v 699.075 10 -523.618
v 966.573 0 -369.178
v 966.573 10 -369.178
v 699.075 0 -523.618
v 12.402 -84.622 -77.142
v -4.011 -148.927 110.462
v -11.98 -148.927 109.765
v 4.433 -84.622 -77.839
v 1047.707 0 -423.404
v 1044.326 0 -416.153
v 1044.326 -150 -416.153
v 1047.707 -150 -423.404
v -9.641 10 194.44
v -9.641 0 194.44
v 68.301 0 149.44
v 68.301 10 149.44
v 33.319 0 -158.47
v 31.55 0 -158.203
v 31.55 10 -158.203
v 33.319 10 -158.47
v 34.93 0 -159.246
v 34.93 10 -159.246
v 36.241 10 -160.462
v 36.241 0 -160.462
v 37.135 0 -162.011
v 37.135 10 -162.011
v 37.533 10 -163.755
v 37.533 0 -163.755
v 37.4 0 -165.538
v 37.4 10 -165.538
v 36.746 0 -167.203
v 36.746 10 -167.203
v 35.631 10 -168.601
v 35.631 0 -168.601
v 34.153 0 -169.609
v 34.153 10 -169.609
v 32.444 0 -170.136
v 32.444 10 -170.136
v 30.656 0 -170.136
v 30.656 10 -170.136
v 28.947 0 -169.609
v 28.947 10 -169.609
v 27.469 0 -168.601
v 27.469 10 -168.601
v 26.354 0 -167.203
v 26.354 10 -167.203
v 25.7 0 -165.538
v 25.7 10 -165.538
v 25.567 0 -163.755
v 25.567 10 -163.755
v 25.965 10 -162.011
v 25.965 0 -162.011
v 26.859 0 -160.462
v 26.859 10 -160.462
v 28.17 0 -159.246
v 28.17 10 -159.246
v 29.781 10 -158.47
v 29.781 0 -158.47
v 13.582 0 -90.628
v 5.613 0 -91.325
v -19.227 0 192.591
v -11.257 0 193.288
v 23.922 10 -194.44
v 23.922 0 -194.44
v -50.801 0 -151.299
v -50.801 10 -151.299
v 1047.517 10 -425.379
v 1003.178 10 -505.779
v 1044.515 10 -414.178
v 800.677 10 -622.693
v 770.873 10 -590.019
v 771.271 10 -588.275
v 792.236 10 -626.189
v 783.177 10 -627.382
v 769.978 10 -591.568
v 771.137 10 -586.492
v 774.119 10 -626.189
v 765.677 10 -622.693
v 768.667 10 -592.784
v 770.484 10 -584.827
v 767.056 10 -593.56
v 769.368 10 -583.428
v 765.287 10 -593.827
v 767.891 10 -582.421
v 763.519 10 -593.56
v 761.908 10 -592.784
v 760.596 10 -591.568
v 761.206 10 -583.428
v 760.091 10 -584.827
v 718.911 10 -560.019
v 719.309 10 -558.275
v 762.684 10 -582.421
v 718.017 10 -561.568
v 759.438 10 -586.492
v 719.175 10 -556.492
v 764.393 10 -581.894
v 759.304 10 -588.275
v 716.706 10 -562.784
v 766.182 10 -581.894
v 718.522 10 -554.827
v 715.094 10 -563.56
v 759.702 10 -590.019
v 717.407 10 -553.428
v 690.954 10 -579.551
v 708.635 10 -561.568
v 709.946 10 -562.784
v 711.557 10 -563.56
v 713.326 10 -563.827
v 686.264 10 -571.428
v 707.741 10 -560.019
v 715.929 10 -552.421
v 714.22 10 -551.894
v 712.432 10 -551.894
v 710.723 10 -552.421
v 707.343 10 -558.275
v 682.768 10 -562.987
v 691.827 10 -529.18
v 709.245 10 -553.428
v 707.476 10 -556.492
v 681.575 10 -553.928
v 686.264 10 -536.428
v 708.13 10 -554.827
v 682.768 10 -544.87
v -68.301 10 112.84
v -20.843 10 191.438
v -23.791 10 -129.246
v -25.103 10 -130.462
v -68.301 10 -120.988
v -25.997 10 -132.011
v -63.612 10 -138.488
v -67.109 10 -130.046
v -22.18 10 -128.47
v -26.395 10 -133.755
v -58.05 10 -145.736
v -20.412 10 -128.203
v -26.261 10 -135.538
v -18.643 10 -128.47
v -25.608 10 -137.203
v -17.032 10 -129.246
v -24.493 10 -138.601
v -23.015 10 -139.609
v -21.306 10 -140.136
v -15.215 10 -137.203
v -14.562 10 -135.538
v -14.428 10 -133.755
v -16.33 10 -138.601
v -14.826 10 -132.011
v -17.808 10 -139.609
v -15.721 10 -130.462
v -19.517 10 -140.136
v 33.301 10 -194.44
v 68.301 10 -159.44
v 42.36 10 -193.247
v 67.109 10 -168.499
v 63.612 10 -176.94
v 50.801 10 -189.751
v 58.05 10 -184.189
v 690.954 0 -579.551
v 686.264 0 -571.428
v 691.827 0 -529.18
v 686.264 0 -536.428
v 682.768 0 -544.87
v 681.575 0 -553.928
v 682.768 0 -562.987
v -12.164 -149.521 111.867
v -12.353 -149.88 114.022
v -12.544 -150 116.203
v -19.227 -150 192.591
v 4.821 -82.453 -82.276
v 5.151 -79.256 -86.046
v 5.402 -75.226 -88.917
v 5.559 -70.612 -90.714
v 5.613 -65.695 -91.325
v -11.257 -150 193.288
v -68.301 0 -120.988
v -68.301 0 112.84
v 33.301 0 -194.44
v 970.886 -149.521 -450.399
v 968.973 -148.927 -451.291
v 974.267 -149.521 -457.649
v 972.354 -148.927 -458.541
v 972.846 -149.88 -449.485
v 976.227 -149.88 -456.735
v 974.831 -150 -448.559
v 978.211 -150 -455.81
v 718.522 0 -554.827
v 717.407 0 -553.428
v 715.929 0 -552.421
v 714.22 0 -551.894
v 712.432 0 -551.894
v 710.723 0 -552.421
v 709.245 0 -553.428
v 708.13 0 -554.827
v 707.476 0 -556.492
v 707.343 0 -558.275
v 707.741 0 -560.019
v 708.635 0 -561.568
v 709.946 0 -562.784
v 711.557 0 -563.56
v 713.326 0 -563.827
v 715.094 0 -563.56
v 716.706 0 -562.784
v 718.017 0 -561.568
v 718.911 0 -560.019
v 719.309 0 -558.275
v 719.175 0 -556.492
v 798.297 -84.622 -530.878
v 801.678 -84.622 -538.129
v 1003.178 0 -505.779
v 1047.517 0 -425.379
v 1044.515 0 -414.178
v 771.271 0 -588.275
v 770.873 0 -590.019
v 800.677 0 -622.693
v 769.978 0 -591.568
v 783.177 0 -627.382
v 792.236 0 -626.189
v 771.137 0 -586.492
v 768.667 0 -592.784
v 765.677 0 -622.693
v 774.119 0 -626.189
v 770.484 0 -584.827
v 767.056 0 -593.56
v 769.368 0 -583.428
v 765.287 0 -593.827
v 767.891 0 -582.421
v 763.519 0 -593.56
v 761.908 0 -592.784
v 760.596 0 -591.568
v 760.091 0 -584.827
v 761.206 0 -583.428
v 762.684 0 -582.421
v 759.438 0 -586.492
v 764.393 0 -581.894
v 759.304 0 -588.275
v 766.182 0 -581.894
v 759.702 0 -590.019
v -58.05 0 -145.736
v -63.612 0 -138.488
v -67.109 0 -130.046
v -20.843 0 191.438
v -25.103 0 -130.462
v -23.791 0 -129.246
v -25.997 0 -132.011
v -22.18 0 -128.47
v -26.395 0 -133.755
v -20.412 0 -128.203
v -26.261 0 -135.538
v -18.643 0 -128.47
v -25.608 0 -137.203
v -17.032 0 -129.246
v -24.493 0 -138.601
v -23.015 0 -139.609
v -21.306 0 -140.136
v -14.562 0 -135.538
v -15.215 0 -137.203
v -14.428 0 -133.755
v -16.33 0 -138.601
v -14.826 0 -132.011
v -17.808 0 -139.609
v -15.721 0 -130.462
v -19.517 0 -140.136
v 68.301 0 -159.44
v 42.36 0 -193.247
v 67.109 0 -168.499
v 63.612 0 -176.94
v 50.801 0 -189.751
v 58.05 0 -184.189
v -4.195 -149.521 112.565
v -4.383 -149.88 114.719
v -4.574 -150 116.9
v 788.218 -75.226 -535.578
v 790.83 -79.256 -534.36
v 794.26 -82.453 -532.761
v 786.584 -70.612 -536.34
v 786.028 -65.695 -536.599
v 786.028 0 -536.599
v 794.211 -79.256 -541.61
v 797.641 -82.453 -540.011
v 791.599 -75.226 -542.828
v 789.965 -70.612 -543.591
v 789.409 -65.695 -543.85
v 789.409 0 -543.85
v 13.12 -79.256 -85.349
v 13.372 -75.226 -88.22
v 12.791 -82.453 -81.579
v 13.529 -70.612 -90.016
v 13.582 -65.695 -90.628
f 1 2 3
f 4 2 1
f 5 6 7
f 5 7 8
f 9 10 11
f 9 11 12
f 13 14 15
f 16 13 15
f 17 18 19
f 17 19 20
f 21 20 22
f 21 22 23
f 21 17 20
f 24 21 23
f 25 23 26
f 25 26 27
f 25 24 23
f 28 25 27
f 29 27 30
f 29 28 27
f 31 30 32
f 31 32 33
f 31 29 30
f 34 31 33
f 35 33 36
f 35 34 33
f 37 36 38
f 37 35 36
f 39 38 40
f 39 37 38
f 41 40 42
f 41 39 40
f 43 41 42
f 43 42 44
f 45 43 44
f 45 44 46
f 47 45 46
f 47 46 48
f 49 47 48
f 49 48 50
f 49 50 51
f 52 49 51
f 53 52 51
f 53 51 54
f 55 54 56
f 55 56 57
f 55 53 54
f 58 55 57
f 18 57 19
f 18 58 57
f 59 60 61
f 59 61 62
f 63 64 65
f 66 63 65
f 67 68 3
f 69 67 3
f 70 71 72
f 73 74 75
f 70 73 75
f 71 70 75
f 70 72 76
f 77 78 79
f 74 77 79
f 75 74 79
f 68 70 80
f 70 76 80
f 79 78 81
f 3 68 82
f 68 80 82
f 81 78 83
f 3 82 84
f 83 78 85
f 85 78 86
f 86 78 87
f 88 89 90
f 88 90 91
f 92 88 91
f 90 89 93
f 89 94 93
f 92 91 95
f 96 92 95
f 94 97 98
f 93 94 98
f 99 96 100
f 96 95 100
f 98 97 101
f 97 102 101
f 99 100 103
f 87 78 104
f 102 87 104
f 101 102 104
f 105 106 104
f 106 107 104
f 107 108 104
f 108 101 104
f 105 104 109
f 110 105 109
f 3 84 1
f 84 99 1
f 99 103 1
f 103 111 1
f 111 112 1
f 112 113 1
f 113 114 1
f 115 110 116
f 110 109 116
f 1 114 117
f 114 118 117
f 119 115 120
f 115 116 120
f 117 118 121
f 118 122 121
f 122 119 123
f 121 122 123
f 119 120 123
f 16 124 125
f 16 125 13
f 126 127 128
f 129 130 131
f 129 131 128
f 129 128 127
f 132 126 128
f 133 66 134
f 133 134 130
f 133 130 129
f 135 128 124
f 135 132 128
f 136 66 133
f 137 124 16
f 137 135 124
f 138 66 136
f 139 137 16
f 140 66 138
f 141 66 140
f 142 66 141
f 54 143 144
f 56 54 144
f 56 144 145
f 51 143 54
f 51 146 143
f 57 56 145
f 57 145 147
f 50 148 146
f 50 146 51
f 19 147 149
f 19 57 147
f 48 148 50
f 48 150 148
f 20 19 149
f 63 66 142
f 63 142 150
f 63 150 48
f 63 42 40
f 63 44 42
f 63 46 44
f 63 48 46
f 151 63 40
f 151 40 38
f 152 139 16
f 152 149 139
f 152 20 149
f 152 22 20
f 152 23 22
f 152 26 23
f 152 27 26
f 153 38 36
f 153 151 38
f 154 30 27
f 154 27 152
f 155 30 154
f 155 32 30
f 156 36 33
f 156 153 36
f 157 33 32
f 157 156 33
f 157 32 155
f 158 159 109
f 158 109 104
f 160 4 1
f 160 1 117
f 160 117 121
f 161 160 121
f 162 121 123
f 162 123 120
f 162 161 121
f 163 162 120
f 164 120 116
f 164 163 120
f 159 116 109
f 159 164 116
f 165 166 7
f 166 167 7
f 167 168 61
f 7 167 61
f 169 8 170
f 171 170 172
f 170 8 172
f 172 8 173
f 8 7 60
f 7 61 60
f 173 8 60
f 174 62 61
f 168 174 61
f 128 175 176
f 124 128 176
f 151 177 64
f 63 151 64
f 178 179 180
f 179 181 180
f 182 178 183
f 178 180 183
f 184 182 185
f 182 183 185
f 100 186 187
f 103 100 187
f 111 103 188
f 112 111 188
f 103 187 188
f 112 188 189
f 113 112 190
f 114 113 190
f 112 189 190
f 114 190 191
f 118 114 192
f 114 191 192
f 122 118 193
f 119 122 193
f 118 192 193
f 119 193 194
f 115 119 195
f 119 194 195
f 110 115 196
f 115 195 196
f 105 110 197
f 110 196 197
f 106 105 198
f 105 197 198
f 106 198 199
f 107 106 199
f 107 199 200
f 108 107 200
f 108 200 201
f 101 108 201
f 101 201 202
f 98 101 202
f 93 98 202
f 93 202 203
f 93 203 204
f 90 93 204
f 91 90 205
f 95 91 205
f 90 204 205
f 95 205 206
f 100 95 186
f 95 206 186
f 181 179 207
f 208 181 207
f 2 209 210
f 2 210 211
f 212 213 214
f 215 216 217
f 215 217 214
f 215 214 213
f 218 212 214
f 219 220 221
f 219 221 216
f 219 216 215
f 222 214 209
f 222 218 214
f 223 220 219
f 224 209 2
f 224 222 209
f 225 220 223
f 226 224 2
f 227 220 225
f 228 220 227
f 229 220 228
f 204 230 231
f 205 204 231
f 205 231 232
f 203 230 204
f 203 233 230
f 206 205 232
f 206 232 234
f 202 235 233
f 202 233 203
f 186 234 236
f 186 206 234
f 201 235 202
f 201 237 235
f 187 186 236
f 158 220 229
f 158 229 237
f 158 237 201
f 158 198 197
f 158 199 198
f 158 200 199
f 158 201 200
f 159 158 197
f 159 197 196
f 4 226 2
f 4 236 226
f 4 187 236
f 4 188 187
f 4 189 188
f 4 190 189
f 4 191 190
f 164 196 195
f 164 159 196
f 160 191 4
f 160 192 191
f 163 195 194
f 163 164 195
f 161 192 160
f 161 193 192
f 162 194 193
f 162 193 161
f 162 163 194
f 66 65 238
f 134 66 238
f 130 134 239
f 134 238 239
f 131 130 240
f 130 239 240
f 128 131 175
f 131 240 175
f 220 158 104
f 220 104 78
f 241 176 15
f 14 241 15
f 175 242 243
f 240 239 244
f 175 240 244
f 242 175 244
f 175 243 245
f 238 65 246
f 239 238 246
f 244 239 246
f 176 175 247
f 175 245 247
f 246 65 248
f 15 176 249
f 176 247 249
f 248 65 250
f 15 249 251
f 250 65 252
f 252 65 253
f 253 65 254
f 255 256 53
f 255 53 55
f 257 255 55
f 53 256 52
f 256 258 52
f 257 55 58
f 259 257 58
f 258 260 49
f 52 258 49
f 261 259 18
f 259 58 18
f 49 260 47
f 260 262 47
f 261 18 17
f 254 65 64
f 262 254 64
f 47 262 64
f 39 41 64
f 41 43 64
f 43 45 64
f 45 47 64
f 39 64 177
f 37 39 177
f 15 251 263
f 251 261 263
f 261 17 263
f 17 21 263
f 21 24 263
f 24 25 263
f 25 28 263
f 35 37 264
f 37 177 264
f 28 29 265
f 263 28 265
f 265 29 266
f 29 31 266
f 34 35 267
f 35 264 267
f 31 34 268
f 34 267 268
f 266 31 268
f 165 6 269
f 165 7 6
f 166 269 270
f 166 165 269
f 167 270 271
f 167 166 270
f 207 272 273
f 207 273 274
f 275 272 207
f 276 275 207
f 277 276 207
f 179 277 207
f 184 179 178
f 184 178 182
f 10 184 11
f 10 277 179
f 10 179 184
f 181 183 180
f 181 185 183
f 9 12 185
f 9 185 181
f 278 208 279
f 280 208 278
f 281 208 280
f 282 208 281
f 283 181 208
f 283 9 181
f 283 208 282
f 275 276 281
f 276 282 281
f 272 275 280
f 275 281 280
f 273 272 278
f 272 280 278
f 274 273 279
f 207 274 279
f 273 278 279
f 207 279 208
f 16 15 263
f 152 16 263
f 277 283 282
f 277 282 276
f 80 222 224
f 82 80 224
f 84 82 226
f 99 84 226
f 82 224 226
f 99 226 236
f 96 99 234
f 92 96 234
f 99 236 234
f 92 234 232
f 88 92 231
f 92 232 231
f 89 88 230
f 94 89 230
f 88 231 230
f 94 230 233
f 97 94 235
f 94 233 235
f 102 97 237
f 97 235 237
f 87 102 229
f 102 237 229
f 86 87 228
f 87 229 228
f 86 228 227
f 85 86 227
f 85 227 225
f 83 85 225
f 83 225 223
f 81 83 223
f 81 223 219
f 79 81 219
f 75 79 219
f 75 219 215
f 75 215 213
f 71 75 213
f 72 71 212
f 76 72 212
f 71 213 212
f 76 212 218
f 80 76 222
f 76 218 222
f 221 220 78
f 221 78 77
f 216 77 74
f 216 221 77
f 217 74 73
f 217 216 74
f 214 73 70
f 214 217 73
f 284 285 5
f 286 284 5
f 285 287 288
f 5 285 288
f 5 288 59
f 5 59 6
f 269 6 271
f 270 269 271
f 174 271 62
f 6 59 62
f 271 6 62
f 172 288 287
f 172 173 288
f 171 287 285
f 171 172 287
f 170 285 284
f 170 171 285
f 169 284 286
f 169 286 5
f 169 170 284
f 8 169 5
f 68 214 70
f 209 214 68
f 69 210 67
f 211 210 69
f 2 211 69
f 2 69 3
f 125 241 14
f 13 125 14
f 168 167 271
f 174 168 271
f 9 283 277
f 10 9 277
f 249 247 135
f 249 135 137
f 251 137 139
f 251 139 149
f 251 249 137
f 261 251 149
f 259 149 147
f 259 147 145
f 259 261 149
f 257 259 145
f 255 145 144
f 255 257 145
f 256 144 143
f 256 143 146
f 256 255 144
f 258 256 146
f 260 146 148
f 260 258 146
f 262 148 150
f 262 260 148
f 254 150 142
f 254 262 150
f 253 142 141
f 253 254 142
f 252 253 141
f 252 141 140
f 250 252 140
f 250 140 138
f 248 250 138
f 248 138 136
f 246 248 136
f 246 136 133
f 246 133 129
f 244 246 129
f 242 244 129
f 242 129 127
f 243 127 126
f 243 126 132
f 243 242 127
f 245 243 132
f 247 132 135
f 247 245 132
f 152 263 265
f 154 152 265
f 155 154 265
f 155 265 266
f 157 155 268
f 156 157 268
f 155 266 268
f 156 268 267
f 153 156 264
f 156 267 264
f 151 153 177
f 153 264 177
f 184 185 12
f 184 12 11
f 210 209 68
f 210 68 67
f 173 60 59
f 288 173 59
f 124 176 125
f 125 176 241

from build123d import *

# Parameters (mm, degrees)
SKETCH1_R           = 6
BOSS_EXTRUDE1_DEPTH = 10
EXTRUDE_THIN1_DEPTH = 150
CUT_EXTRUDE1_DEPTH  = 8
FILLET1_R           = 20


with BuildPart() as part:
    # Sketch1 → Boss-Extrude1 (new body)
    with BuildSketch(Plane(origin=(0, 0, 0), x_dir=(1, 0, 0), z_dir=(0, 1, 0))):
        with BuildLine():
            Line((23.921775059, 194.44), (-50.80127019, 151.298629711))
            ThreePointArc((-50.80127019, 151.298629711), (-63.612159322, 138.487740578), (-68.30127019, 120.987740578))
            Line((-68.30127019, 120.987740578), (-68.30127019, -112.84))
            Line((-68.30127019, -112.84), (-20.842811266, -191.438488045))
            Line((-20.842811266, -191.438488045), (-9.641016151, -194.44))
            Line((-9.641016151, -194.44), (68.30127019, -149.44))
            Line((68.30127019, -149.44), (68.30127019, 159.44))
            ThreePointArc((68.30127019, 159.44), (58.050007532, 184.188737342), (33.30127019, 194.44))
            Line((33.30127019, 194.44), (23.921775059, 194.44))
        make_face()
        with Locations(Location((31.55, 164.203141572, 0), (0, 0, 270))):
            Circle(SKETCH1_R, mode=Mode.SUBTRACT)
        with Locations(Location((-20.411524227, 134.203141572, 0), (0, 0, 270))):
            Circle(SKETCH1_R, mode=Mode.SUBTRACT)
    extrude(amount=BOSS_EXTRUDE1_DEPTH)


with BuildPart() as body_2:
    # Sketch2 → Extrude-Thin1 (new body)
    with BuildSketch(Plane.XZ):
        Polygon((-19.2266925, 192.590621052), (5.612694183, -91.324867905), (13.582251767, -90.627621963), (-11.257134916, 193.287866994), align=None)
    extrude(amount=EXTRUDE_THIN1_DEPTH)

    # Sketch3 → Cut-Extrude1 (cut)
    with BuildSketch(Plane(origin=(5.610418606, 0, 0.490848026), x_dir=(0.08715574274766193, 0, -0.9961946980917453), z_dir=(0.9961946980917453, 0, 0.08715574274766193))):
        Polygon((91.466527741, -150), (-113.533472259, -150), (91.466527741, -80), align=None)
    extrude(amount=-CUT_EXTRUDE1_DEPTH, mode=Mode.SUBTRACT)

    # Fillet1
    fillet1_edges = [body_2.edges().sort_by_distance(p)[0] for p in [
        (-8.269454288, -150, 113.243668175),
        (9.597472975, -80, -90.976244934),
    ]]
    fillet(fillet1_edges, radius=FILLET1_R)


with BuildPart() as body_3:
    # Mirror2: mirrored copy
    add(part.part.mirror(Plane(origin=(435.6525, 0, -251.524088148), x_dir=(0.49999999999999495, 0, 0.8660254037844416), z_dir=(-0.8660254037844416, 0, 0.49999999999999495))))


with BuildPart() as body_4:
    # Mirror2 2: mirrored copy
    add(body_2.part.mirror(Plane(origin=(435.6525, 0, -251.524088148), x_dir=(0.49999999999999495, 0, 0.8660254037844416), z_dir=(-0.8660254037844416, 0, 0.49999999999999495))))


solid = Compound([part.part, body_2.part, body_3.part, body_4.part])
